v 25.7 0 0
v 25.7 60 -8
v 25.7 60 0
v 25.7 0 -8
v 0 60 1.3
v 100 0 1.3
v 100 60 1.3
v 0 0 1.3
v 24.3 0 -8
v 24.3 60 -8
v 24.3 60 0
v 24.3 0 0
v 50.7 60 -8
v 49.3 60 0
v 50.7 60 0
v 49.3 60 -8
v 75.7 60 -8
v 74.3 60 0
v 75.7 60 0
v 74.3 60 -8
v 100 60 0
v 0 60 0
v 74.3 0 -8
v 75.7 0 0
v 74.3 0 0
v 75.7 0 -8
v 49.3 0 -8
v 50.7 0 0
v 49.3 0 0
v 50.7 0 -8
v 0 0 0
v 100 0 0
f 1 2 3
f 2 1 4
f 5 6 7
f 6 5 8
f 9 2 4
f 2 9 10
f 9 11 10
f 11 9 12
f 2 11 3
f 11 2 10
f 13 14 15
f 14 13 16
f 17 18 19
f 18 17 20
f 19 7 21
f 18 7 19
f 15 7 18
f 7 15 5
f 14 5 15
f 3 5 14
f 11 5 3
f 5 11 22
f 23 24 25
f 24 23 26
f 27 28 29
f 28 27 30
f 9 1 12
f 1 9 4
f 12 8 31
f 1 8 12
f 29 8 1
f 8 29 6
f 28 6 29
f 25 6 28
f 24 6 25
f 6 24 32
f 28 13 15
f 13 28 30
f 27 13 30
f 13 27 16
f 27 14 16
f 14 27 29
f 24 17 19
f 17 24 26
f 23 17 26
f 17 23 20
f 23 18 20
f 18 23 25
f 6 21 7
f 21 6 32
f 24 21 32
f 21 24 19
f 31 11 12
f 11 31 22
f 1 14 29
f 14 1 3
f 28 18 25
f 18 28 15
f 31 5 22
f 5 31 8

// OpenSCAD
$fn = 32;

// ----------------------------------------------------------------------
// Ribbed panel: 1.3 mm panel
// ----------------------------------------------------------------------

// --- parameters (mm) ---
panel_l = 100;            // panel length, X
panel_w = 60;             // panel width, Y
panel_t = 1.3;            // panel thickness, Z
rib_t = 1.4;              // rib thickness
rib_h = 8;                // rib height below the panel
ribs = 3;                 // number of ribs

total_h = panel_t + rib_h;  // overall height

union() {
  cube([panel_l, panel_w, panel_t]);
  for (i = [1 : ribs])
    translate([i * panel_l / (ribs + 1) - rib_t / 2, 0, -rib_h])
      cube([rib_t, panel_w, rib_h + panel_t]);
}
